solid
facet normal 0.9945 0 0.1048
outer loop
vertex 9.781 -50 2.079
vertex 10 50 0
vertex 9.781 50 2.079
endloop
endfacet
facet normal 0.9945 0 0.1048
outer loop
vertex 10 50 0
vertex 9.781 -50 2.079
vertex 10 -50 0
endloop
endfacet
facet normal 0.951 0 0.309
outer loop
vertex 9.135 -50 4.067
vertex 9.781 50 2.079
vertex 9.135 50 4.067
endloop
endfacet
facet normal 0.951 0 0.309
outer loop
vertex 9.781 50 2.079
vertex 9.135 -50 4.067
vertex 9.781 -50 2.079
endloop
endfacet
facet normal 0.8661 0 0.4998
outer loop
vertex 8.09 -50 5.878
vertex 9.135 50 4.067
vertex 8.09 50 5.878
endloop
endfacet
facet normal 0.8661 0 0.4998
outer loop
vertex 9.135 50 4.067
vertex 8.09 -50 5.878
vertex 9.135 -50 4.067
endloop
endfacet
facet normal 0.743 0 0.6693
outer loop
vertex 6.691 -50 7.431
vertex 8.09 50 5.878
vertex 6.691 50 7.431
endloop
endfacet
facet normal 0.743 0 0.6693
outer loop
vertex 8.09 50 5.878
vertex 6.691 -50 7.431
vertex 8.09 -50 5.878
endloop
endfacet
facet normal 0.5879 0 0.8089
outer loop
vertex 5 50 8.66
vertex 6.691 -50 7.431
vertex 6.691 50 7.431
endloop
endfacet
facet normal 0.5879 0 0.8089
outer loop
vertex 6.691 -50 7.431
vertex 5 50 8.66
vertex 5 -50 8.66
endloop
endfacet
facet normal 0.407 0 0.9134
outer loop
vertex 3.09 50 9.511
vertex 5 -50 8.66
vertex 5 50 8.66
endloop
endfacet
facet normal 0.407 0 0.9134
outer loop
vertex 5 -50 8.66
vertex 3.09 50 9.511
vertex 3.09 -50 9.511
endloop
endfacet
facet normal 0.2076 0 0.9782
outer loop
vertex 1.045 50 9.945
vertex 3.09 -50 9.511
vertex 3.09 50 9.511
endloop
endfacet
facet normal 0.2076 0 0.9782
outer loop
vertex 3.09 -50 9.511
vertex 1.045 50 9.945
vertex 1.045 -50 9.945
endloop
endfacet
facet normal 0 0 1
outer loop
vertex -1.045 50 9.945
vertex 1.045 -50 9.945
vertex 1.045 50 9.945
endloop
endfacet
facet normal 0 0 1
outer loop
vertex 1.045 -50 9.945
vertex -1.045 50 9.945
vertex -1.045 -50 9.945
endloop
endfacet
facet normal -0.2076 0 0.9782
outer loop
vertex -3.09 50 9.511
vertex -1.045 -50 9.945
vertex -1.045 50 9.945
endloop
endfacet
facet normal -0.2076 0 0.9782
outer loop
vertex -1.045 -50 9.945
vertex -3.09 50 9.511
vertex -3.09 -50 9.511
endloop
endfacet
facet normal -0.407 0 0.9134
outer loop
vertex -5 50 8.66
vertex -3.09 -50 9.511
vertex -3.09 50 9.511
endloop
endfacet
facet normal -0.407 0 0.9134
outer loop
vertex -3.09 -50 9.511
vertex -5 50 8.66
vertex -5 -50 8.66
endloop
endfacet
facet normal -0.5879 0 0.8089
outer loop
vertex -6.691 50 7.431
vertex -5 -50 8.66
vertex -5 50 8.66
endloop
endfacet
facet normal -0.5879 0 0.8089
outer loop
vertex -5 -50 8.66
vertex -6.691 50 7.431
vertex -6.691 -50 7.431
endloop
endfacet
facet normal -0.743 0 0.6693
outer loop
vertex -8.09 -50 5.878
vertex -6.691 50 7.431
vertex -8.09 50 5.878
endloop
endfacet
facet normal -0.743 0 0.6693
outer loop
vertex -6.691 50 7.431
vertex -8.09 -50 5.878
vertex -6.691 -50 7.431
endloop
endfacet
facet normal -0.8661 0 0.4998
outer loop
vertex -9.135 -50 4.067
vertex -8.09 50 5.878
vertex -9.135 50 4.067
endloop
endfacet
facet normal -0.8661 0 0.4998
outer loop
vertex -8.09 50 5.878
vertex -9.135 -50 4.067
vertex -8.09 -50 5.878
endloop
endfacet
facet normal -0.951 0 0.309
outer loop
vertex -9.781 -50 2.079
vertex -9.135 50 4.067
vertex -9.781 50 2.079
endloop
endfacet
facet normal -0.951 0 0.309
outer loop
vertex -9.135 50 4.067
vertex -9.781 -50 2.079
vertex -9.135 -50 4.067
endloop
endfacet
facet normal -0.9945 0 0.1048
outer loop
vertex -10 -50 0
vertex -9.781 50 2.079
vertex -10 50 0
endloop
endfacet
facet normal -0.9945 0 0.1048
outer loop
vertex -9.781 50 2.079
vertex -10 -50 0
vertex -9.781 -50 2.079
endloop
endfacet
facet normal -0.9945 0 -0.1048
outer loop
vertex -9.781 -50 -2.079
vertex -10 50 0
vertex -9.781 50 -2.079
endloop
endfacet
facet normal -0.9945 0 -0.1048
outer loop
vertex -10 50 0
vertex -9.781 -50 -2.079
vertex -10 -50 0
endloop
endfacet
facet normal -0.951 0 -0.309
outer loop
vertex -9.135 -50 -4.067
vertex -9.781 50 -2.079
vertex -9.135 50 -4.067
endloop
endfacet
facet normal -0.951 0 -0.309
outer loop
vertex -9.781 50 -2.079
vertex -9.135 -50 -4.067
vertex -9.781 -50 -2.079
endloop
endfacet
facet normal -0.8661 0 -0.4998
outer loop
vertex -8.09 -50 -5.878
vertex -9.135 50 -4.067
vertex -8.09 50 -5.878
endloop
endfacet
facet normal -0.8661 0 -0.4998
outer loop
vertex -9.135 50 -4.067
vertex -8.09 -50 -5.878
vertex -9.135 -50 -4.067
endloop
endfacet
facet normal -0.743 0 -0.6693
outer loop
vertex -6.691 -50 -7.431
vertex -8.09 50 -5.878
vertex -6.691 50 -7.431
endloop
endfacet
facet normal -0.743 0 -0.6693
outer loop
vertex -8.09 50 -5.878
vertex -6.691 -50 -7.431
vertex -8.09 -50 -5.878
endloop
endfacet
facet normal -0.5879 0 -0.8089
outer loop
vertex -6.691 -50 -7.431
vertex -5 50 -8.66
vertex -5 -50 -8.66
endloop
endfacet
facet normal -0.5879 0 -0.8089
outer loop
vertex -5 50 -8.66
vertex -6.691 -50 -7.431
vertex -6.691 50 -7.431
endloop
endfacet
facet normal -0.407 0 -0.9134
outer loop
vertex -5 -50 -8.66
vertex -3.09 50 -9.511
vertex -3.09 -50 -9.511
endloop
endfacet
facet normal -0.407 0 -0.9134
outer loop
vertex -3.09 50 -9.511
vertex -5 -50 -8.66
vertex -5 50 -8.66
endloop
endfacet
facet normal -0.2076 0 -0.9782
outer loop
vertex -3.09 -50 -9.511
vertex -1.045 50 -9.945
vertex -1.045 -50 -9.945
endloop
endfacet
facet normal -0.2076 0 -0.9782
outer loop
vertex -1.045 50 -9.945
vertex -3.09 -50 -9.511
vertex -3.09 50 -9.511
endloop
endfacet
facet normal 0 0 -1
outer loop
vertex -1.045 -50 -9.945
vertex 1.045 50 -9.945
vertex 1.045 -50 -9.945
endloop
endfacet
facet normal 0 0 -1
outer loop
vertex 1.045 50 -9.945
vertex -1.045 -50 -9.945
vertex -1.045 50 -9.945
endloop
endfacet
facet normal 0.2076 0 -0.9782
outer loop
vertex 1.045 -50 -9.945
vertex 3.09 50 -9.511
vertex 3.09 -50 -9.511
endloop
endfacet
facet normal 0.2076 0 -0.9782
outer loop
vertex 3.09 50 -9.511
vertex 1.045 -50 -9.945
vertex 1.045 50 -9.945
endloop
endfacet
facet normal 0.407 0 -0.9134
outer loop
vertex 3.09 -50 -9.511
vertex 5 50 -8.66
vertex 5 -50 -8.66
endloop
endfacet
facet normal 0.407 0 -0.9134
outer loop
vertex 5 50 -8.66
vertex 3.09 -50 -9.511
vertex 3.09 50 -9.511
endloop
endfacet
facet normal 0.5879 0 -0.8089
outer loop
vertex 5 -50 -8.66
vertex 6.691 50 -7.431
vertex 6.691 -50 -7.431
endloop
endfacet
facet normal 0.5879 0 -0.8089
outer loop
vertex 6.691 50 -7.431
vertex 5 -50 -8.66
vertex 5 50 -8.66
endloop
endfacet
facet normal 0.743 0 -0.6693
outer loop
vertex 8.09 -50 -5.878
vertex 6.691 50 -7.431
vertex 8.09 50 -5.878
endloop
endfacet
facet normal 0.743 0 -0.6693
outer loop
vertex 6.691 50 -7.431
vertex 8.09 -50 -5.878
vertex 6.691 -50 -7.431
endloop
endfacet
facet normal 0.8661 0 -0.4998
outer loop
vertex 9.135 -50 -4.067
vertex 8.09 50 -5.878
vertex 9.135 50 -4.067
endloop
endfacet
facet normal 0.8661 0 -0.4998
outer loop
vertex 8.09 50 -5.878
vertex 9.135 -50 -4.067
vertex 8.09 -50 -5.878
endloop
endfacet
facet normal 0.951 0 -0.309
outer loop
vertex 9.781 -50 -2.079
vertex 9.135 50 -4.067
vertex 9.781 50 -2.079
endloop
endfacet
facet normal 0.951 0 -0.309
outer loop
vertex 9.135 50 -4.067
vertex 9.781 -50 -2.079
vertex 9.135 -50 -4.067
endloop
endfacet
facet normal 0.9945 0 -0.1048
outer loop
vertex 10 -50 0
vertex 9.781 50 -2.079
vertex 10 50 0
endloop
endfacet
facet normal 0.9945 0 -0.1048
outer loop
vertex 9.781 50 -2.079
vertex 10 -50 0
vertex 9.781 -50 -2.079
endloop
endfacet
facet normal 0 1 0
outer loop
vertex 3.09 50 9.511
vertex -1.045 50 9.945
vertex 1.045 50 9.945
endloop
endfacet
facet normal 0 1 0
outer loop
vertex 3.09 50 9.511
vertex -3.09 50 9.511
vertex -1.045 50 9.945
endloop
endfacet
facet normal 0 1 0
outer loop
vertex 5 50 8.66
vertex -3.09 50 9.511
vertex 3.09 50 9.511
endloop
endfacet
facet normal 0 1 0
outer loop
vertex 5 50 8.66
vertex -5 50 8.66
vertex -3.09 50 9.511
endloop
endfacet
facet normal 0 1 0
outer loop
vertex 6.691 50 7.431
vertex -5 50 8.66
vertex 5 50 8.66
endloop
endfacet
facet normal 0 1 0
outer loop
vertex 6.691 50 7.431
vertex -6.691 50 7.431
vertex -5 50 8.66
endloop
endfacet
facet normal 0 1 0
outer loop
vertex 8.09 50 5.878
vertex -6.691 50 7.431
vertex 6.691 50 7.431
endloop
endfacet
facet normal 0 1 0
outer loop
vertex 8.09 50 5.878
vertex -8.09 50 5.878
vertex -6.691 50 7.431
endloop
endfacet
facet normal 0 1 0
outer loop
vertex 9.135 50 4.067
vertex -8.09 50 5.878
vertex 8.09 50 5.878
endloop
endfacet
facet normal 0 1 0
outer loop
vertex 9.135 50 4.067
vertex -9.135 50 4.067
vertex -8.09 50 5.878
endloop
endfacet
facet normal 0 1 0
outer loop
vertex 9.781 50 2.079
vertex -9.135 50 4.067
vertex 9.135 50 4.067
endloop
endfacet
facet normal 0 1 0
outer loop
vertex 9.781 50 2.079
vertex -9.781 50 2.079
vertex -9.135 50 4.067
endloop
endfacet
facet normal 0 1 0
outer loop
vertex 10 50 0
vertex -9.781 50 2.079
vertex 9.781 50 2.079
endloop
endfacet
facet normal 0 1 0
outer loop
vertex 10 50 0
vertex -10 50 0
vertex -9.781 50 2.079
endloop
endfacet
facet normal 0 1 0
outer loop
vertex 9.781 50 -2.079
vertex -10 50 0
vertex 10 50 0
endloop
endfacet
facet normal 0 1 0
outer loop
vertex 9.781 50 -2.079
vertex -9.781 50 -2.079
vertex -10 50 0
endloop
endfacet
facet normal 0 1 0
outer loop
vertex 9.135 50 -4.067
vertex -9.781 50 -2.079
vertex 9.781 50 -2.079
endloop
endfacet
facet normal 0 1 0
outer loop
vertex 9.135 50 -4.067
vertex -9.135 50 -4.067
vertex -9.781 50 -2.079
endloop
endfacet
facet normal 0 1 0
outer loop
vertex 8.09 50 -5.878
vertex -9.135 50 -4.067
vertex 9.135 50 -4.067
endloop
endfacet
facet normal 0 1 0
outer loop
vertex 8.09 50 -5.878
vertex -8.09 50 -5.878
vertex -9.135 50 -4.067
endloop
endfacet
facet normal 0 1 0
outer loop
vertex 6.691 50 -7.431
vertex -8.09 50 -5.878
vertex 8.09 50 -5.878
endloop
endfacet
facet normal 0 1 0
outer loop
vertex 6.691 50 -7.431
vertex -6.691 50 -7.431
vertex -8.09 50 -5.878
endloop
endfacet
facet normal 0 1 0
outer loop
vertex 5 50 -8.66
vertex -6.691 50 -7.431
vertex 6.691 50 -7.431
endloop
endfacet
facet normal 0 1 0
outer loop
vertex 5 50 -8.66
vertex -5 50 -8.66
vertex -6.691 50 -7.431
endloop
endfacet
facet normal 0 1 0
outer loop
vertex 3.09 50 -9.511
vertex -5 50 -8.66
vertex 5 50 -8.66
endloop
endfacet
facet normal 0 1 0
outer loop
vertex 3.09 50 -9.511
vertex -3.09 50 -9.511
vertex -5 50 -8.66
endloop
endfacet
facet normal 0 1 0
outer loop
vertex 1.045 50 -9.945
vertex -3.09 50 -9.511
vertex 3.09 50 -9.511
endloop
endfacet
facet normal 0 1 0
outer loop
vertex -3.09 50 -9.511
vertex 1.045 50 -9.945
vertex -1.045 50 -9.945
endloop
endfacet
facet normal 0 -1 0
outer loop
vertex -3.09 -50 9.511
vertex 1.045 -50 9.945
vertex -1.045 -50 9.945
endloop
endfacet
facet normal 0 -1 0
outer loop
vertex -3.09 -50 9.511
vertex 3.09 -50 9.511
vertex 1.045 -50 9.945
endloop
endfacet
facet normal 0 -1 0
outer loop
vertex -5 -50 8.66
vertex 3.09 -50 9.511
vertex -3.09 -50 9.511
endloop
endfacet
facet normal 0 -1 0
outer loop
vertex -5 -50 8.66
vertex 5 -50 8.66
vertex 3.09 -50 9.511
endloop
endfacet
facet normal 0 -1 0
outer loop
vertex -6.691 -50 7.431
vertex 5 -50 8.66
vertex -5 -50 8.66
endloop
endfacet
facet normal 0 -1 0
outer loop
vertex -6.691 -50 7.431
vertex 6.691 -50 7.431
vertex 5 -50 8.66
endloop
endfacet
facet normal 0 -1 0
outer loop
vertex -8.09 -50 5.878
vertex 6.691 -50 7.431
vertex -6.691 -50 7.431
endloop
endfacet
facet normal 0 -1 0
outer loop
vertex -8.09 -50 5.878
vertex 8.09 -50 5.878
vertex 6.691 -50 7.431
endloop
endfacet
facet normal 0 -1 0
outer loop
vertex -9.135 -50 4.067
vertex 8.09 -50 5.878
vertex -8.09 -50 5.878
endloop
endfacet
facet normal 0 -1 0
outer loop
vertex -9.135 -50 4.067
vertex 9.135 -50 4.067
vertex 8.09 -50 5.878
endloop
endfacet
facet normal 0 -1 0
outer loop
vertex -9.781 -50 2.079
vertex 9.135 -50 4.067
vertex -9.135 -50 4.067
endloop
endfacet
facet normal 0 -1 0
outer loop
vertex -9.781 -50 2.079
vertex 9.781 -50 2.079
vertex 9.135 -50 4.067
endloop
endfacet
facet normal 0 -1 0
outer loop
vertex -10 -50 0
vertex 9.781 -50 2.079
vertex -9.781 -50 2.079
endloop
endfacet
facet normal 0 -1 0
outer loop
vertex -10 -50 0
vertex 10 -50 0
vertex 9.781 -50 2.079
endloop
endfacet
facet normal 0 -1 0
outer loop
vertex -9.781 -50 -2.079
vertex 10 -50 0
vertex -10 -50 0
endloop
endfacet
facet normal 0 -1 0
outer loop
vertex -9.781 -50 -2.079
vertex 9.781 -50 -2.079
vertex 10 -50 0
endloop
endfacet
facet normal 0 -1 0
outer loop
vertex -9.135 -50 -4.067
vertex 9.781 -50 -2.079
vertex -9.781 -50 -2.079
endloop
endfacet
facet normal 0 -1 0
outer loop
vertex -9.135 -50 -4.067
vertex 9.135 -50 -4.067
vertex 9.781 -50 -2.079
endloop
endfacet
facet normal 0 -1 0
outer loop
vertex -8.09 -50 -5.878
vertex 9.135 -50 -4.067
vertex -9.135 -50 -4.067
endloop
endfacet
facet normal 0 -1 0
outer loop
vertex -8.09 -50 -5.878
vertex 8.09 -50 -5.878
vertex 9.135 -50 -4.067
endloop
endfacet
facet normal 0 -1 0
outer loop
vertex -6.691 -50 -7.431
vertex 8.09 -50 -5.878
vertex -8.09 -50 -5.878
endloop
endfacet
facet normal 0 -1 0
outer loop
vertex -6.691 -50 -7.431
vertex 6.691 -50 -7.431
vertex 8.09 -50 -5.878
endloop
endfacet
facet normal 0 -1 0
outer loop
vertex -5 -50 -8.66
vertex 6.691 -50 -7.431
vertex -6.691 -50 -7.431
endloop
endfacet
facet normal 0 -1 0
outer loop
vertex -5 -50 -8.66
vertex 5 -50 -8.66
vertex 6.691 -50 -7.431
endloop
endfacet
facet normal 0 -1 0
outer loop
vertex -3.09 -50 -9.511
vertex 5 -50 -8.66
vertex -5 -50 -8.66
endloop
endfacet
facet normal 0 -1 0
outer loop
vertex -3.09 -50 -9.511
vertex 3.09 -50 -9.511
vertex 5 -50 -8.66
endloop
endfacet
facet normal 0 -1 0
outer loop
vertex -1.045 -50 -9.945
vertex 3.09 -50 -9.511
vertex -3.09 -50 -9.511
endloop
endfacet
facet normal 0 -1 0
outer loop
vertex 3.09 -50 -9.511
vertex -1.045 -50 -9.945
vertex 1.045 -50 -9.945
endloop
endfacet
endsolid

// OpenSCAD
module hole(distance, rot, size) {
    rotate(a = rot, v = [1, 0, 0]) {
        translate([0, distance, 0]) {
            cylinder(r = size, h = 100, center = true);
        }
    }
}
hole(0, 90, 10);
